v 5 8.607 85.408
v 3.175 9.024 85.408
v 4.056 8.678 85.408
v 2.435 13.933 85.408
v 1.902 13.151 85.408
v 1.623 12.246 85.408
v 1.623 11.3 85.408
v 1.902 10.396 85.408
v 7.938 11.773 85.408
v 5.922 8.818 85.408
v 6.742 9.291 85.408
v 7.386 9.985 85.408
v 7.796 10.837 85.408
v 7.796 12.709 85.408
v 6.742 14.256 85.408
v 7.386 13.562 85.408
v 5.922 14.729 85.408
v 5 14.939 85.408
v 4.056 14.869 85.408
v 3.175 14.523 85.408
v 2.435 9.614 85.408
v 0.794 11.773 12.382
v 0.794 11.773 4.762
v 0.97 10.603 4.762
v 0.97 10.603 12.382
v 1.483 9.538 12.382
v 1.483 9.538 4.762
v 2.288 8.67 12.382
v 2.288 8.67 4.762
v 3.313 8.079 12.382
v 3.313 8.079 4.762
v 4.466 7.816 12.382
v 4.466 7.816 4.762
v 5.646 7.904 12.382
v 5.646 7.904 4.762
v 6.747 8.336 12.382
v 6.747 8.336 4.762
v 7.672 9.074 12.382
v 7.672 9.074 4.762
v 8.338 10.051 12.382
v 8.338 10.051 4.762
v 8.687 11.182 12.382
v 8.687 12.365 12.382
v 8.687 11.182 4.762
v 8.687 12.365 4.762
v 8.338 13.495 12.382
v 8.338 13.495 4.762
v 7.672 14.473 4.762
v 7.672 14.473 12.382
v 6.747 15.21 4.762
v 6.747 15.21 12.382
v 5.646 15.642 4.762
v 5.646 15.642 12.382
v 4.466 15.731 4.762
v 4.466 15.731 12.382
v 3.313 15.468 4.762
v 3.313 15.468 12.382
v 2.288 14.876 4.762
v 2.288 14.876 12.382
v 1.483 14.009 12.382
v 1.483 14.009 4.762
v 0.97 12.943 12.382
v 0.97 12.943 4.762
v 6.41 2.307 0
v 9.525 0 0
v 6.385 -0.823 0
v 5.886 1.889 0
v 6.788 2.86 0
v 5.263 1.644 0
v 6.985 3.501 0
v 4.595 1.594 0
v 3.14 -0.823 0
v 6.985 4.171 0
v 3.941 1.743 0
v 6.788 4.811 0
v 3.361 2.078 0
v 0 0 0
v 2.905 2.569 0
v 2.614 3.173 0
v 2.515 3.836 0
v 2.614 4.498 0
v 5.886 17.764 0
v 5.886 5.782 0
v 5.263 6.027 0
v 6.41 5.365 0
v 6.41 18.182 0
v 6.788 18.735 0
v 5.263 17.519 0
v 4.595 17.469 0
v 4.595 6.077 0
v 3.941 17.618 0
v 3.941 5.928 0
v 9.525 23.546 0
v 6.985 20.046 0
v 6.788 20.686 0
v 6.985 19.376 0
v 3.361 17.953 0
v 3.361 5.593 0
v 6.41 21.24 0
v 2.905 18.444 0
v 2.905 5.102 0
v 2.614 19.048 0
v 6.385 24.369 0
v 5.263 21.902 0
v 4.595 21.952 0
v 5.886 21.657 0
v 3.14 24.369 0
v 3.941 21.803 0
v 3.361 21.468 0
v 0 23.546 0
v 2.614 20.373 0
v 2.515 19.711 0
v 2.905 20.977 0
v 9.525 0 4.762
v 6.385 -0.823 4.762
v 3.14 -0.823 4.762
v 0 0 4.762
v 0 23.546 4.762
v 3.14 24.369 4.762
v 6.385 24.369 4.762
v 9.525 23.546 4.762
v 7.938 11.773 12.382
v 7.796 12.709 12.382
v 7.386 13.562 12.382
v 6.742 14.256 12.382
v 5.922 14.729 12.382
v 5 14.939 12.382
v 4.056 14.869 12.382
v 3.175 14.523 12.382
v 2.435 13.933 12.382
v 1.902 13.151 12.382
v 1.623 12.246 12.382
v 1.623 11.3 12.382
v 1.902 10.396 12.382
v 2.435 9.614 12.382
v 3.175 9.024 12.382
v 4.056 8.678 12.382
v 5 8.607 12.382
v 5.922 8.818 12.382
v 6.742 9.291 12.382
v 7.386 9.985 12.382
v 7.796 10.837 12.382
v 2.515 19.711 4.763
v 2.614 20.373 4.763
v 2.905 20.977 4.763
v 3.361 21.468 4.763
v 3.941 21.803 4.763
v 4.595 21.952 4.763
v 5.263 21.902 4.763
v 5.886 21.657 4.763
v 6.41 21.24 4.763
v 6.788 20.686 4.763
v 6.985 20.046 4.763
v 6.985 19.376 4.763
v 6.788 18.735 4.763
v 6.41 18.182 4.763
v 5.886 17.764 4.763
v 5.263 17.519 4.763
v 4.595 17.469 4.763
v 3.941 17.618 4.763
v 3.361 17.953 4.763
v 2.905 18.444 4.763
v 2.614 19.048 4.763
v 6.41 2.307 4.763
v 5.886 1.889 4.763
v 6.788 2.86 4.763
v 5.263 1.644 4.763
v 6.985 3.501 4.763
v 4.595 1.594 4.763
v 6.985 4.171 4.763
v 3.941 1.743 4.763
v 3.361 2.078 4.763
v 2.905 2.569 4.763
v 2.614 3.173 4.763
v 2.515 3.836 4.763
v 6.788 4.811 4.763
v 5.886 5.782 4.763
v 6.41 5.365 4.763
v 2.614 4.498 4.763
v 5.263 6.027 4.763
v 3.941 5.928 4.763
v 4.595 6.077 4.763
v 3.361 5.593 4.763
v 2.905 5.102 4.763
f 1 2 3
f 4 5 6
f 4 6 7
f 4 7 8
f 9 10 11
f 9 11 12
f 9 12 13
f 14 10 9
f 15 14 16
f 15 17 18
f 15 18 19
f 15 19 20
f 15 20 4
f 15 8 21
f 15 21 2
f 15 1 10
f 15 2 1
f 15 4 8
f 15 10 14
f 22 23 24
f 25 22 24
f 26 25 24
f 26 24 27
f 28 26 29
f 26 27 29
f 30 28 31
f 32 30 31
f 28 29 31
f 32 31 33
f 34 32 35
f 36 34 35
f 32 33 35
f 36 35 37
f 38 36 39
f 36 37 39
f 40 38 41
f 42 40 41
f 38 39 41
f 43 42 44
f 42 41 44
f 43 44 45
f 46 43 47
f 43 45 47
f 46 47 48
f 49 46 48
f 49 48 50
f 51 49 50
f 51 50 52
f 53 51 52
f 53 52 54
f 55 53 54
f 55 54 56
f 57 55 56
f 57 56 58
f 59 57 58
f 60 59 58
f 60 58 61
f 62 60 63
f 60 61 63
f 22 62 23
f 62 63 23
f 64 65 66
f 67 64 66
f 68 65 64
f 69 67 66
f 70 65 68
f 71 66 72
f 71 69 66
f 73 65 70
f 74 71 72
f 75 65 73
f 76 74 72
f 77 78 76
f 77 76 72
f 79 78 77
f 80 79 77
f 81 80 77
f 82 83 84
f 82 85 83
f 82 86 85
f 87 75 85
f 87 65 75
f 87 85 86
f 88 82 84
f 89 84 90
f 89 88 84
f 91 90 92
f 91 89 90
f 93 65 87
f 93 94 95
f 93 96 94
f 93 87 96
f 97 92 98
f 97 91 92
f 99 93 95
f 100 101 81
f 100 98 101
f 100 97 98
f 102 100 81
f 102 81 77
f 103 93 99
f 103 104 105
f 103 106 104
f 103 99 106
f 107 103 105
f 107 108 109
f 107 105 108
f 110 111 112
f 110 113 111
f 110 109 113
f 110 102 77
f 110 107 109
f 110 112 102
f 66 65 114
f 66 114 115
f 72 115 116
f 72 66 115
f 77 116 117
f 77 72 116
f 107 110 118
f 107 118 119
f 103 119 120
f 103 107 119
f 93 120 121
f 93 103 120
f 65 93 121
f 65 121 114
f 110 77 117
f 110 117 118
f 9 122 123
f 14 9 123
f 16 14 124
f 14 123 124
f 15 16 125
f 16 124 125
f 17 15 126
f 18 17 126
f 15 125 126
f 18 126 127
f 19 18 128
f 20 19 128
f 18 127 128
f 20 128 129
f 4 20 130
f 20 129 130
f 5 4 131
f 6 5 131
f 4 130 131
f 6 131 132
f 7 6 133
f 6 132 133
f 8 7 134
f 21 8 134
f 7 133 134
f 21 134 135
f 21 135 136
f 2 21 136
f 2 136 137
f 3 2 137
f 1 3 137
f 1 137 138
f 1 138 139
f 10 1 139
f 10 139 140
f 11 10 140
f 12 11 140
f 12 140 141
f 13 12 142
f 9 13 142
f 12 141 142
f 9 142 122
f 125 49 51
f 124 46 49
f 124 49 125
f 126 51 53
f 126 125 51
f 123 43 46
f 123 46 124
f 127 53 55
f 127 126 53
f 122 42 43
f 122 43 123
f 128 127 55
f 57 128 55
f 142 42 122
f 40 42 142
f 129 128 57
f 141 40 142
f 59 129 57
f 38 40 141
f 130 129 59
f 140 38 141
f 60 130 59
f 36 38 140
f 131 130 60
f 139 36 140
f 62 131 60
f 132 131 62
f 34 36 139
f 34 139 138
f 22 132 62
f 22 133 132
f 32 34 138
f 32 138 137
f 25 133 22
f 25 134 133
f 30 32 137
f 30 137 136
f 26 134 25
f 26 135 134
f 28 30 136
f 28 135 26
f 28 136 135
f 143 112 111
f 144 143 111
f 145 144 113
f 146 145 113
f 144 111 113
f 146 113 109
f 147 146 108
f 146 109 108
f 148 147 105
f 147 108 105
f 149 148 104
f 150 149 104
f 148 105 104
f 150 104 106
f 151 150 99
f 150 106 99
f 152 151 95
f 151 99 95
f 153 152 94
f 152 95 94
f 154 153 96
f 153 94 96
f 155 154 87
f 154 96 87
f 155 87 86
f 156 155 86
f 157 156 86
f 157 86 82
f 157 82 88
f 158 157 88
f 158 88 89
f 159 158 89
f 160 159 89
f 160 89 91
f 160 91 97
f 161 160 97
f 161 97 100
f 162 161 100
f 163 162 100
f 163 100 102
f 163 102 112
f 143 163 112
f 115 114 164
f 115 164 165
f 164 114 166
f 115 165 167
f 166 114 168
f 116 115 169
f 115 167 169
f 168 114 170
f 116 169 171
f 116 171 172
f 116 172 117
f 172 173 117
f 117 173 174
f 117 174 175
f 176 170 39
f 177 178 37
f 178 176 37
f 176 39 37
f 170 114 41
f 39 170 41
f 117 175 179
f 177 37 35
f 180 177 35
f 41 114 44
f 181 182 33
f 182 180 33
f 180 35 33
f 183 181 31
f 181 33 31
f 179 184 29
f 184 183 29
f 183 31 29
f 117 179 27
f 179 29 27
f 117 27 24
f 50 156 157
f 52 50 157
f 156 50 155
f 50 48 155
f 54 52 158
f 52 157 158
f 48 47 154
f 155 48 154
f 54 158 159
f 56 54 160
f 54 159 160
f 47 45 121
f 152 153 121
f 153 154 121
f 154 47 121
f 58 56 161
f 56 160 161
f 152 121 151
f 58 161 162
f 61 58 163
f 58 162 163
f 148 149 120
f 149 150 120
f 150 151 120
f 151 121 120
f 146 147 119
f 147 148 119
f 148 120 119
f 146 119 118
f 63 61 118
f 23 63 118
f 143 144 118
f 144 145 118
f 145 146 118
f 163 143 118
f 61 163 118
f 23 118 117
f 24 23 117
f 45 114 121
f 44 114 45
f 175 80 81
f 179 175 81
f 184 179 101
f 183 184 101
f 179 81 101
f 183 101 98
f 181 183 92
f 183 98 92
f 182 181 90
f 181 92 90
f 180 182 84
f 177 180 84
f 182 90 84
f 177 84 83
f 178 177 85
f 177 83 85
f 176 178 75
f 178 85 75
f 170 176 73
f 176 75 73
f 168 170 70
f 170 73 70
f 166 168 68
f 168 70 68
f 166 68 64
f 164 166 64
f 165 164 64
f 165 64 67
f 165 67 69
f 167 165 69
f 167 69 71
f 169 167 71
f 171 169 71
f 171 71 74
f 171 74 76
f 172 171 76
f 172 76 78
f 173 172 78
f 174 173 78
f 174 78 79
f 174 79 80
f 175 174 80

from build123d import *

# Parameters (mm, degrees)
BOSS_EXTRUDE1_DEPTH         = 4.7625
SKETCH2_R                   = 3.96875
BOSS_EXTRUDE2_DEPTH         = 7.62
SKETCH3_R                   = 3.175
BOSS_EXTRUDE3_DEPTH         = 73.025
F_16_0_177_DIAMETER_HOLE1_D = 4.4958


with BuildPart() as part:
    # Sketch1 → Boss-Extrude1 (new body)
    with BuildSketch(Plane.XY):
        with BuildLine():
            Line((0, 0), (0, 23.546430197))
            ThreePointArc((0, 23.546430197), (4.7625, 24.473215098), (9.525, 23.546430197))
            Line((9.525, 23.546430197), (9.525, 0))
            ThreePointArc((9.525, 0), (4.7625, -0.926784902), (0, 0))
        make_face()
    extrude(amount=BOSS_EXTRUDE1_DEPTH)

    # Sketch2 → Boss-Extrude2 (add)
    with BuildSketch(Plane.XY.offset(4.7625)):
        with Locations(Location((4.7625, 11.773215098, 0), (0, 0, 180))):
            Circle(SKETCH2_R)
    extrude(amount=BOSS_EXTRUDE2_DEPTH)

    # Sketch3 → Boss-Extrude3 (add)
    with BuildSketch(Plane.XY.offset(12.3825)):
        with Locations((4.7625, 11.773215098)):
            Circle(SKETCH3_R)
    extrude(amount=BOSS_EXTRUDE3_DEPTH)

    # #16 (0.177) Diameter Hole1 (through all)
    with Locations(Plane.XY.offset(4.7625)):
        with Locations((4.7625, 3.835715098), (4.7625, 19.710715098)):
            Hole(F_16_0_177_DIAMETER_HOLE1_D / 2)


solid = part.part
